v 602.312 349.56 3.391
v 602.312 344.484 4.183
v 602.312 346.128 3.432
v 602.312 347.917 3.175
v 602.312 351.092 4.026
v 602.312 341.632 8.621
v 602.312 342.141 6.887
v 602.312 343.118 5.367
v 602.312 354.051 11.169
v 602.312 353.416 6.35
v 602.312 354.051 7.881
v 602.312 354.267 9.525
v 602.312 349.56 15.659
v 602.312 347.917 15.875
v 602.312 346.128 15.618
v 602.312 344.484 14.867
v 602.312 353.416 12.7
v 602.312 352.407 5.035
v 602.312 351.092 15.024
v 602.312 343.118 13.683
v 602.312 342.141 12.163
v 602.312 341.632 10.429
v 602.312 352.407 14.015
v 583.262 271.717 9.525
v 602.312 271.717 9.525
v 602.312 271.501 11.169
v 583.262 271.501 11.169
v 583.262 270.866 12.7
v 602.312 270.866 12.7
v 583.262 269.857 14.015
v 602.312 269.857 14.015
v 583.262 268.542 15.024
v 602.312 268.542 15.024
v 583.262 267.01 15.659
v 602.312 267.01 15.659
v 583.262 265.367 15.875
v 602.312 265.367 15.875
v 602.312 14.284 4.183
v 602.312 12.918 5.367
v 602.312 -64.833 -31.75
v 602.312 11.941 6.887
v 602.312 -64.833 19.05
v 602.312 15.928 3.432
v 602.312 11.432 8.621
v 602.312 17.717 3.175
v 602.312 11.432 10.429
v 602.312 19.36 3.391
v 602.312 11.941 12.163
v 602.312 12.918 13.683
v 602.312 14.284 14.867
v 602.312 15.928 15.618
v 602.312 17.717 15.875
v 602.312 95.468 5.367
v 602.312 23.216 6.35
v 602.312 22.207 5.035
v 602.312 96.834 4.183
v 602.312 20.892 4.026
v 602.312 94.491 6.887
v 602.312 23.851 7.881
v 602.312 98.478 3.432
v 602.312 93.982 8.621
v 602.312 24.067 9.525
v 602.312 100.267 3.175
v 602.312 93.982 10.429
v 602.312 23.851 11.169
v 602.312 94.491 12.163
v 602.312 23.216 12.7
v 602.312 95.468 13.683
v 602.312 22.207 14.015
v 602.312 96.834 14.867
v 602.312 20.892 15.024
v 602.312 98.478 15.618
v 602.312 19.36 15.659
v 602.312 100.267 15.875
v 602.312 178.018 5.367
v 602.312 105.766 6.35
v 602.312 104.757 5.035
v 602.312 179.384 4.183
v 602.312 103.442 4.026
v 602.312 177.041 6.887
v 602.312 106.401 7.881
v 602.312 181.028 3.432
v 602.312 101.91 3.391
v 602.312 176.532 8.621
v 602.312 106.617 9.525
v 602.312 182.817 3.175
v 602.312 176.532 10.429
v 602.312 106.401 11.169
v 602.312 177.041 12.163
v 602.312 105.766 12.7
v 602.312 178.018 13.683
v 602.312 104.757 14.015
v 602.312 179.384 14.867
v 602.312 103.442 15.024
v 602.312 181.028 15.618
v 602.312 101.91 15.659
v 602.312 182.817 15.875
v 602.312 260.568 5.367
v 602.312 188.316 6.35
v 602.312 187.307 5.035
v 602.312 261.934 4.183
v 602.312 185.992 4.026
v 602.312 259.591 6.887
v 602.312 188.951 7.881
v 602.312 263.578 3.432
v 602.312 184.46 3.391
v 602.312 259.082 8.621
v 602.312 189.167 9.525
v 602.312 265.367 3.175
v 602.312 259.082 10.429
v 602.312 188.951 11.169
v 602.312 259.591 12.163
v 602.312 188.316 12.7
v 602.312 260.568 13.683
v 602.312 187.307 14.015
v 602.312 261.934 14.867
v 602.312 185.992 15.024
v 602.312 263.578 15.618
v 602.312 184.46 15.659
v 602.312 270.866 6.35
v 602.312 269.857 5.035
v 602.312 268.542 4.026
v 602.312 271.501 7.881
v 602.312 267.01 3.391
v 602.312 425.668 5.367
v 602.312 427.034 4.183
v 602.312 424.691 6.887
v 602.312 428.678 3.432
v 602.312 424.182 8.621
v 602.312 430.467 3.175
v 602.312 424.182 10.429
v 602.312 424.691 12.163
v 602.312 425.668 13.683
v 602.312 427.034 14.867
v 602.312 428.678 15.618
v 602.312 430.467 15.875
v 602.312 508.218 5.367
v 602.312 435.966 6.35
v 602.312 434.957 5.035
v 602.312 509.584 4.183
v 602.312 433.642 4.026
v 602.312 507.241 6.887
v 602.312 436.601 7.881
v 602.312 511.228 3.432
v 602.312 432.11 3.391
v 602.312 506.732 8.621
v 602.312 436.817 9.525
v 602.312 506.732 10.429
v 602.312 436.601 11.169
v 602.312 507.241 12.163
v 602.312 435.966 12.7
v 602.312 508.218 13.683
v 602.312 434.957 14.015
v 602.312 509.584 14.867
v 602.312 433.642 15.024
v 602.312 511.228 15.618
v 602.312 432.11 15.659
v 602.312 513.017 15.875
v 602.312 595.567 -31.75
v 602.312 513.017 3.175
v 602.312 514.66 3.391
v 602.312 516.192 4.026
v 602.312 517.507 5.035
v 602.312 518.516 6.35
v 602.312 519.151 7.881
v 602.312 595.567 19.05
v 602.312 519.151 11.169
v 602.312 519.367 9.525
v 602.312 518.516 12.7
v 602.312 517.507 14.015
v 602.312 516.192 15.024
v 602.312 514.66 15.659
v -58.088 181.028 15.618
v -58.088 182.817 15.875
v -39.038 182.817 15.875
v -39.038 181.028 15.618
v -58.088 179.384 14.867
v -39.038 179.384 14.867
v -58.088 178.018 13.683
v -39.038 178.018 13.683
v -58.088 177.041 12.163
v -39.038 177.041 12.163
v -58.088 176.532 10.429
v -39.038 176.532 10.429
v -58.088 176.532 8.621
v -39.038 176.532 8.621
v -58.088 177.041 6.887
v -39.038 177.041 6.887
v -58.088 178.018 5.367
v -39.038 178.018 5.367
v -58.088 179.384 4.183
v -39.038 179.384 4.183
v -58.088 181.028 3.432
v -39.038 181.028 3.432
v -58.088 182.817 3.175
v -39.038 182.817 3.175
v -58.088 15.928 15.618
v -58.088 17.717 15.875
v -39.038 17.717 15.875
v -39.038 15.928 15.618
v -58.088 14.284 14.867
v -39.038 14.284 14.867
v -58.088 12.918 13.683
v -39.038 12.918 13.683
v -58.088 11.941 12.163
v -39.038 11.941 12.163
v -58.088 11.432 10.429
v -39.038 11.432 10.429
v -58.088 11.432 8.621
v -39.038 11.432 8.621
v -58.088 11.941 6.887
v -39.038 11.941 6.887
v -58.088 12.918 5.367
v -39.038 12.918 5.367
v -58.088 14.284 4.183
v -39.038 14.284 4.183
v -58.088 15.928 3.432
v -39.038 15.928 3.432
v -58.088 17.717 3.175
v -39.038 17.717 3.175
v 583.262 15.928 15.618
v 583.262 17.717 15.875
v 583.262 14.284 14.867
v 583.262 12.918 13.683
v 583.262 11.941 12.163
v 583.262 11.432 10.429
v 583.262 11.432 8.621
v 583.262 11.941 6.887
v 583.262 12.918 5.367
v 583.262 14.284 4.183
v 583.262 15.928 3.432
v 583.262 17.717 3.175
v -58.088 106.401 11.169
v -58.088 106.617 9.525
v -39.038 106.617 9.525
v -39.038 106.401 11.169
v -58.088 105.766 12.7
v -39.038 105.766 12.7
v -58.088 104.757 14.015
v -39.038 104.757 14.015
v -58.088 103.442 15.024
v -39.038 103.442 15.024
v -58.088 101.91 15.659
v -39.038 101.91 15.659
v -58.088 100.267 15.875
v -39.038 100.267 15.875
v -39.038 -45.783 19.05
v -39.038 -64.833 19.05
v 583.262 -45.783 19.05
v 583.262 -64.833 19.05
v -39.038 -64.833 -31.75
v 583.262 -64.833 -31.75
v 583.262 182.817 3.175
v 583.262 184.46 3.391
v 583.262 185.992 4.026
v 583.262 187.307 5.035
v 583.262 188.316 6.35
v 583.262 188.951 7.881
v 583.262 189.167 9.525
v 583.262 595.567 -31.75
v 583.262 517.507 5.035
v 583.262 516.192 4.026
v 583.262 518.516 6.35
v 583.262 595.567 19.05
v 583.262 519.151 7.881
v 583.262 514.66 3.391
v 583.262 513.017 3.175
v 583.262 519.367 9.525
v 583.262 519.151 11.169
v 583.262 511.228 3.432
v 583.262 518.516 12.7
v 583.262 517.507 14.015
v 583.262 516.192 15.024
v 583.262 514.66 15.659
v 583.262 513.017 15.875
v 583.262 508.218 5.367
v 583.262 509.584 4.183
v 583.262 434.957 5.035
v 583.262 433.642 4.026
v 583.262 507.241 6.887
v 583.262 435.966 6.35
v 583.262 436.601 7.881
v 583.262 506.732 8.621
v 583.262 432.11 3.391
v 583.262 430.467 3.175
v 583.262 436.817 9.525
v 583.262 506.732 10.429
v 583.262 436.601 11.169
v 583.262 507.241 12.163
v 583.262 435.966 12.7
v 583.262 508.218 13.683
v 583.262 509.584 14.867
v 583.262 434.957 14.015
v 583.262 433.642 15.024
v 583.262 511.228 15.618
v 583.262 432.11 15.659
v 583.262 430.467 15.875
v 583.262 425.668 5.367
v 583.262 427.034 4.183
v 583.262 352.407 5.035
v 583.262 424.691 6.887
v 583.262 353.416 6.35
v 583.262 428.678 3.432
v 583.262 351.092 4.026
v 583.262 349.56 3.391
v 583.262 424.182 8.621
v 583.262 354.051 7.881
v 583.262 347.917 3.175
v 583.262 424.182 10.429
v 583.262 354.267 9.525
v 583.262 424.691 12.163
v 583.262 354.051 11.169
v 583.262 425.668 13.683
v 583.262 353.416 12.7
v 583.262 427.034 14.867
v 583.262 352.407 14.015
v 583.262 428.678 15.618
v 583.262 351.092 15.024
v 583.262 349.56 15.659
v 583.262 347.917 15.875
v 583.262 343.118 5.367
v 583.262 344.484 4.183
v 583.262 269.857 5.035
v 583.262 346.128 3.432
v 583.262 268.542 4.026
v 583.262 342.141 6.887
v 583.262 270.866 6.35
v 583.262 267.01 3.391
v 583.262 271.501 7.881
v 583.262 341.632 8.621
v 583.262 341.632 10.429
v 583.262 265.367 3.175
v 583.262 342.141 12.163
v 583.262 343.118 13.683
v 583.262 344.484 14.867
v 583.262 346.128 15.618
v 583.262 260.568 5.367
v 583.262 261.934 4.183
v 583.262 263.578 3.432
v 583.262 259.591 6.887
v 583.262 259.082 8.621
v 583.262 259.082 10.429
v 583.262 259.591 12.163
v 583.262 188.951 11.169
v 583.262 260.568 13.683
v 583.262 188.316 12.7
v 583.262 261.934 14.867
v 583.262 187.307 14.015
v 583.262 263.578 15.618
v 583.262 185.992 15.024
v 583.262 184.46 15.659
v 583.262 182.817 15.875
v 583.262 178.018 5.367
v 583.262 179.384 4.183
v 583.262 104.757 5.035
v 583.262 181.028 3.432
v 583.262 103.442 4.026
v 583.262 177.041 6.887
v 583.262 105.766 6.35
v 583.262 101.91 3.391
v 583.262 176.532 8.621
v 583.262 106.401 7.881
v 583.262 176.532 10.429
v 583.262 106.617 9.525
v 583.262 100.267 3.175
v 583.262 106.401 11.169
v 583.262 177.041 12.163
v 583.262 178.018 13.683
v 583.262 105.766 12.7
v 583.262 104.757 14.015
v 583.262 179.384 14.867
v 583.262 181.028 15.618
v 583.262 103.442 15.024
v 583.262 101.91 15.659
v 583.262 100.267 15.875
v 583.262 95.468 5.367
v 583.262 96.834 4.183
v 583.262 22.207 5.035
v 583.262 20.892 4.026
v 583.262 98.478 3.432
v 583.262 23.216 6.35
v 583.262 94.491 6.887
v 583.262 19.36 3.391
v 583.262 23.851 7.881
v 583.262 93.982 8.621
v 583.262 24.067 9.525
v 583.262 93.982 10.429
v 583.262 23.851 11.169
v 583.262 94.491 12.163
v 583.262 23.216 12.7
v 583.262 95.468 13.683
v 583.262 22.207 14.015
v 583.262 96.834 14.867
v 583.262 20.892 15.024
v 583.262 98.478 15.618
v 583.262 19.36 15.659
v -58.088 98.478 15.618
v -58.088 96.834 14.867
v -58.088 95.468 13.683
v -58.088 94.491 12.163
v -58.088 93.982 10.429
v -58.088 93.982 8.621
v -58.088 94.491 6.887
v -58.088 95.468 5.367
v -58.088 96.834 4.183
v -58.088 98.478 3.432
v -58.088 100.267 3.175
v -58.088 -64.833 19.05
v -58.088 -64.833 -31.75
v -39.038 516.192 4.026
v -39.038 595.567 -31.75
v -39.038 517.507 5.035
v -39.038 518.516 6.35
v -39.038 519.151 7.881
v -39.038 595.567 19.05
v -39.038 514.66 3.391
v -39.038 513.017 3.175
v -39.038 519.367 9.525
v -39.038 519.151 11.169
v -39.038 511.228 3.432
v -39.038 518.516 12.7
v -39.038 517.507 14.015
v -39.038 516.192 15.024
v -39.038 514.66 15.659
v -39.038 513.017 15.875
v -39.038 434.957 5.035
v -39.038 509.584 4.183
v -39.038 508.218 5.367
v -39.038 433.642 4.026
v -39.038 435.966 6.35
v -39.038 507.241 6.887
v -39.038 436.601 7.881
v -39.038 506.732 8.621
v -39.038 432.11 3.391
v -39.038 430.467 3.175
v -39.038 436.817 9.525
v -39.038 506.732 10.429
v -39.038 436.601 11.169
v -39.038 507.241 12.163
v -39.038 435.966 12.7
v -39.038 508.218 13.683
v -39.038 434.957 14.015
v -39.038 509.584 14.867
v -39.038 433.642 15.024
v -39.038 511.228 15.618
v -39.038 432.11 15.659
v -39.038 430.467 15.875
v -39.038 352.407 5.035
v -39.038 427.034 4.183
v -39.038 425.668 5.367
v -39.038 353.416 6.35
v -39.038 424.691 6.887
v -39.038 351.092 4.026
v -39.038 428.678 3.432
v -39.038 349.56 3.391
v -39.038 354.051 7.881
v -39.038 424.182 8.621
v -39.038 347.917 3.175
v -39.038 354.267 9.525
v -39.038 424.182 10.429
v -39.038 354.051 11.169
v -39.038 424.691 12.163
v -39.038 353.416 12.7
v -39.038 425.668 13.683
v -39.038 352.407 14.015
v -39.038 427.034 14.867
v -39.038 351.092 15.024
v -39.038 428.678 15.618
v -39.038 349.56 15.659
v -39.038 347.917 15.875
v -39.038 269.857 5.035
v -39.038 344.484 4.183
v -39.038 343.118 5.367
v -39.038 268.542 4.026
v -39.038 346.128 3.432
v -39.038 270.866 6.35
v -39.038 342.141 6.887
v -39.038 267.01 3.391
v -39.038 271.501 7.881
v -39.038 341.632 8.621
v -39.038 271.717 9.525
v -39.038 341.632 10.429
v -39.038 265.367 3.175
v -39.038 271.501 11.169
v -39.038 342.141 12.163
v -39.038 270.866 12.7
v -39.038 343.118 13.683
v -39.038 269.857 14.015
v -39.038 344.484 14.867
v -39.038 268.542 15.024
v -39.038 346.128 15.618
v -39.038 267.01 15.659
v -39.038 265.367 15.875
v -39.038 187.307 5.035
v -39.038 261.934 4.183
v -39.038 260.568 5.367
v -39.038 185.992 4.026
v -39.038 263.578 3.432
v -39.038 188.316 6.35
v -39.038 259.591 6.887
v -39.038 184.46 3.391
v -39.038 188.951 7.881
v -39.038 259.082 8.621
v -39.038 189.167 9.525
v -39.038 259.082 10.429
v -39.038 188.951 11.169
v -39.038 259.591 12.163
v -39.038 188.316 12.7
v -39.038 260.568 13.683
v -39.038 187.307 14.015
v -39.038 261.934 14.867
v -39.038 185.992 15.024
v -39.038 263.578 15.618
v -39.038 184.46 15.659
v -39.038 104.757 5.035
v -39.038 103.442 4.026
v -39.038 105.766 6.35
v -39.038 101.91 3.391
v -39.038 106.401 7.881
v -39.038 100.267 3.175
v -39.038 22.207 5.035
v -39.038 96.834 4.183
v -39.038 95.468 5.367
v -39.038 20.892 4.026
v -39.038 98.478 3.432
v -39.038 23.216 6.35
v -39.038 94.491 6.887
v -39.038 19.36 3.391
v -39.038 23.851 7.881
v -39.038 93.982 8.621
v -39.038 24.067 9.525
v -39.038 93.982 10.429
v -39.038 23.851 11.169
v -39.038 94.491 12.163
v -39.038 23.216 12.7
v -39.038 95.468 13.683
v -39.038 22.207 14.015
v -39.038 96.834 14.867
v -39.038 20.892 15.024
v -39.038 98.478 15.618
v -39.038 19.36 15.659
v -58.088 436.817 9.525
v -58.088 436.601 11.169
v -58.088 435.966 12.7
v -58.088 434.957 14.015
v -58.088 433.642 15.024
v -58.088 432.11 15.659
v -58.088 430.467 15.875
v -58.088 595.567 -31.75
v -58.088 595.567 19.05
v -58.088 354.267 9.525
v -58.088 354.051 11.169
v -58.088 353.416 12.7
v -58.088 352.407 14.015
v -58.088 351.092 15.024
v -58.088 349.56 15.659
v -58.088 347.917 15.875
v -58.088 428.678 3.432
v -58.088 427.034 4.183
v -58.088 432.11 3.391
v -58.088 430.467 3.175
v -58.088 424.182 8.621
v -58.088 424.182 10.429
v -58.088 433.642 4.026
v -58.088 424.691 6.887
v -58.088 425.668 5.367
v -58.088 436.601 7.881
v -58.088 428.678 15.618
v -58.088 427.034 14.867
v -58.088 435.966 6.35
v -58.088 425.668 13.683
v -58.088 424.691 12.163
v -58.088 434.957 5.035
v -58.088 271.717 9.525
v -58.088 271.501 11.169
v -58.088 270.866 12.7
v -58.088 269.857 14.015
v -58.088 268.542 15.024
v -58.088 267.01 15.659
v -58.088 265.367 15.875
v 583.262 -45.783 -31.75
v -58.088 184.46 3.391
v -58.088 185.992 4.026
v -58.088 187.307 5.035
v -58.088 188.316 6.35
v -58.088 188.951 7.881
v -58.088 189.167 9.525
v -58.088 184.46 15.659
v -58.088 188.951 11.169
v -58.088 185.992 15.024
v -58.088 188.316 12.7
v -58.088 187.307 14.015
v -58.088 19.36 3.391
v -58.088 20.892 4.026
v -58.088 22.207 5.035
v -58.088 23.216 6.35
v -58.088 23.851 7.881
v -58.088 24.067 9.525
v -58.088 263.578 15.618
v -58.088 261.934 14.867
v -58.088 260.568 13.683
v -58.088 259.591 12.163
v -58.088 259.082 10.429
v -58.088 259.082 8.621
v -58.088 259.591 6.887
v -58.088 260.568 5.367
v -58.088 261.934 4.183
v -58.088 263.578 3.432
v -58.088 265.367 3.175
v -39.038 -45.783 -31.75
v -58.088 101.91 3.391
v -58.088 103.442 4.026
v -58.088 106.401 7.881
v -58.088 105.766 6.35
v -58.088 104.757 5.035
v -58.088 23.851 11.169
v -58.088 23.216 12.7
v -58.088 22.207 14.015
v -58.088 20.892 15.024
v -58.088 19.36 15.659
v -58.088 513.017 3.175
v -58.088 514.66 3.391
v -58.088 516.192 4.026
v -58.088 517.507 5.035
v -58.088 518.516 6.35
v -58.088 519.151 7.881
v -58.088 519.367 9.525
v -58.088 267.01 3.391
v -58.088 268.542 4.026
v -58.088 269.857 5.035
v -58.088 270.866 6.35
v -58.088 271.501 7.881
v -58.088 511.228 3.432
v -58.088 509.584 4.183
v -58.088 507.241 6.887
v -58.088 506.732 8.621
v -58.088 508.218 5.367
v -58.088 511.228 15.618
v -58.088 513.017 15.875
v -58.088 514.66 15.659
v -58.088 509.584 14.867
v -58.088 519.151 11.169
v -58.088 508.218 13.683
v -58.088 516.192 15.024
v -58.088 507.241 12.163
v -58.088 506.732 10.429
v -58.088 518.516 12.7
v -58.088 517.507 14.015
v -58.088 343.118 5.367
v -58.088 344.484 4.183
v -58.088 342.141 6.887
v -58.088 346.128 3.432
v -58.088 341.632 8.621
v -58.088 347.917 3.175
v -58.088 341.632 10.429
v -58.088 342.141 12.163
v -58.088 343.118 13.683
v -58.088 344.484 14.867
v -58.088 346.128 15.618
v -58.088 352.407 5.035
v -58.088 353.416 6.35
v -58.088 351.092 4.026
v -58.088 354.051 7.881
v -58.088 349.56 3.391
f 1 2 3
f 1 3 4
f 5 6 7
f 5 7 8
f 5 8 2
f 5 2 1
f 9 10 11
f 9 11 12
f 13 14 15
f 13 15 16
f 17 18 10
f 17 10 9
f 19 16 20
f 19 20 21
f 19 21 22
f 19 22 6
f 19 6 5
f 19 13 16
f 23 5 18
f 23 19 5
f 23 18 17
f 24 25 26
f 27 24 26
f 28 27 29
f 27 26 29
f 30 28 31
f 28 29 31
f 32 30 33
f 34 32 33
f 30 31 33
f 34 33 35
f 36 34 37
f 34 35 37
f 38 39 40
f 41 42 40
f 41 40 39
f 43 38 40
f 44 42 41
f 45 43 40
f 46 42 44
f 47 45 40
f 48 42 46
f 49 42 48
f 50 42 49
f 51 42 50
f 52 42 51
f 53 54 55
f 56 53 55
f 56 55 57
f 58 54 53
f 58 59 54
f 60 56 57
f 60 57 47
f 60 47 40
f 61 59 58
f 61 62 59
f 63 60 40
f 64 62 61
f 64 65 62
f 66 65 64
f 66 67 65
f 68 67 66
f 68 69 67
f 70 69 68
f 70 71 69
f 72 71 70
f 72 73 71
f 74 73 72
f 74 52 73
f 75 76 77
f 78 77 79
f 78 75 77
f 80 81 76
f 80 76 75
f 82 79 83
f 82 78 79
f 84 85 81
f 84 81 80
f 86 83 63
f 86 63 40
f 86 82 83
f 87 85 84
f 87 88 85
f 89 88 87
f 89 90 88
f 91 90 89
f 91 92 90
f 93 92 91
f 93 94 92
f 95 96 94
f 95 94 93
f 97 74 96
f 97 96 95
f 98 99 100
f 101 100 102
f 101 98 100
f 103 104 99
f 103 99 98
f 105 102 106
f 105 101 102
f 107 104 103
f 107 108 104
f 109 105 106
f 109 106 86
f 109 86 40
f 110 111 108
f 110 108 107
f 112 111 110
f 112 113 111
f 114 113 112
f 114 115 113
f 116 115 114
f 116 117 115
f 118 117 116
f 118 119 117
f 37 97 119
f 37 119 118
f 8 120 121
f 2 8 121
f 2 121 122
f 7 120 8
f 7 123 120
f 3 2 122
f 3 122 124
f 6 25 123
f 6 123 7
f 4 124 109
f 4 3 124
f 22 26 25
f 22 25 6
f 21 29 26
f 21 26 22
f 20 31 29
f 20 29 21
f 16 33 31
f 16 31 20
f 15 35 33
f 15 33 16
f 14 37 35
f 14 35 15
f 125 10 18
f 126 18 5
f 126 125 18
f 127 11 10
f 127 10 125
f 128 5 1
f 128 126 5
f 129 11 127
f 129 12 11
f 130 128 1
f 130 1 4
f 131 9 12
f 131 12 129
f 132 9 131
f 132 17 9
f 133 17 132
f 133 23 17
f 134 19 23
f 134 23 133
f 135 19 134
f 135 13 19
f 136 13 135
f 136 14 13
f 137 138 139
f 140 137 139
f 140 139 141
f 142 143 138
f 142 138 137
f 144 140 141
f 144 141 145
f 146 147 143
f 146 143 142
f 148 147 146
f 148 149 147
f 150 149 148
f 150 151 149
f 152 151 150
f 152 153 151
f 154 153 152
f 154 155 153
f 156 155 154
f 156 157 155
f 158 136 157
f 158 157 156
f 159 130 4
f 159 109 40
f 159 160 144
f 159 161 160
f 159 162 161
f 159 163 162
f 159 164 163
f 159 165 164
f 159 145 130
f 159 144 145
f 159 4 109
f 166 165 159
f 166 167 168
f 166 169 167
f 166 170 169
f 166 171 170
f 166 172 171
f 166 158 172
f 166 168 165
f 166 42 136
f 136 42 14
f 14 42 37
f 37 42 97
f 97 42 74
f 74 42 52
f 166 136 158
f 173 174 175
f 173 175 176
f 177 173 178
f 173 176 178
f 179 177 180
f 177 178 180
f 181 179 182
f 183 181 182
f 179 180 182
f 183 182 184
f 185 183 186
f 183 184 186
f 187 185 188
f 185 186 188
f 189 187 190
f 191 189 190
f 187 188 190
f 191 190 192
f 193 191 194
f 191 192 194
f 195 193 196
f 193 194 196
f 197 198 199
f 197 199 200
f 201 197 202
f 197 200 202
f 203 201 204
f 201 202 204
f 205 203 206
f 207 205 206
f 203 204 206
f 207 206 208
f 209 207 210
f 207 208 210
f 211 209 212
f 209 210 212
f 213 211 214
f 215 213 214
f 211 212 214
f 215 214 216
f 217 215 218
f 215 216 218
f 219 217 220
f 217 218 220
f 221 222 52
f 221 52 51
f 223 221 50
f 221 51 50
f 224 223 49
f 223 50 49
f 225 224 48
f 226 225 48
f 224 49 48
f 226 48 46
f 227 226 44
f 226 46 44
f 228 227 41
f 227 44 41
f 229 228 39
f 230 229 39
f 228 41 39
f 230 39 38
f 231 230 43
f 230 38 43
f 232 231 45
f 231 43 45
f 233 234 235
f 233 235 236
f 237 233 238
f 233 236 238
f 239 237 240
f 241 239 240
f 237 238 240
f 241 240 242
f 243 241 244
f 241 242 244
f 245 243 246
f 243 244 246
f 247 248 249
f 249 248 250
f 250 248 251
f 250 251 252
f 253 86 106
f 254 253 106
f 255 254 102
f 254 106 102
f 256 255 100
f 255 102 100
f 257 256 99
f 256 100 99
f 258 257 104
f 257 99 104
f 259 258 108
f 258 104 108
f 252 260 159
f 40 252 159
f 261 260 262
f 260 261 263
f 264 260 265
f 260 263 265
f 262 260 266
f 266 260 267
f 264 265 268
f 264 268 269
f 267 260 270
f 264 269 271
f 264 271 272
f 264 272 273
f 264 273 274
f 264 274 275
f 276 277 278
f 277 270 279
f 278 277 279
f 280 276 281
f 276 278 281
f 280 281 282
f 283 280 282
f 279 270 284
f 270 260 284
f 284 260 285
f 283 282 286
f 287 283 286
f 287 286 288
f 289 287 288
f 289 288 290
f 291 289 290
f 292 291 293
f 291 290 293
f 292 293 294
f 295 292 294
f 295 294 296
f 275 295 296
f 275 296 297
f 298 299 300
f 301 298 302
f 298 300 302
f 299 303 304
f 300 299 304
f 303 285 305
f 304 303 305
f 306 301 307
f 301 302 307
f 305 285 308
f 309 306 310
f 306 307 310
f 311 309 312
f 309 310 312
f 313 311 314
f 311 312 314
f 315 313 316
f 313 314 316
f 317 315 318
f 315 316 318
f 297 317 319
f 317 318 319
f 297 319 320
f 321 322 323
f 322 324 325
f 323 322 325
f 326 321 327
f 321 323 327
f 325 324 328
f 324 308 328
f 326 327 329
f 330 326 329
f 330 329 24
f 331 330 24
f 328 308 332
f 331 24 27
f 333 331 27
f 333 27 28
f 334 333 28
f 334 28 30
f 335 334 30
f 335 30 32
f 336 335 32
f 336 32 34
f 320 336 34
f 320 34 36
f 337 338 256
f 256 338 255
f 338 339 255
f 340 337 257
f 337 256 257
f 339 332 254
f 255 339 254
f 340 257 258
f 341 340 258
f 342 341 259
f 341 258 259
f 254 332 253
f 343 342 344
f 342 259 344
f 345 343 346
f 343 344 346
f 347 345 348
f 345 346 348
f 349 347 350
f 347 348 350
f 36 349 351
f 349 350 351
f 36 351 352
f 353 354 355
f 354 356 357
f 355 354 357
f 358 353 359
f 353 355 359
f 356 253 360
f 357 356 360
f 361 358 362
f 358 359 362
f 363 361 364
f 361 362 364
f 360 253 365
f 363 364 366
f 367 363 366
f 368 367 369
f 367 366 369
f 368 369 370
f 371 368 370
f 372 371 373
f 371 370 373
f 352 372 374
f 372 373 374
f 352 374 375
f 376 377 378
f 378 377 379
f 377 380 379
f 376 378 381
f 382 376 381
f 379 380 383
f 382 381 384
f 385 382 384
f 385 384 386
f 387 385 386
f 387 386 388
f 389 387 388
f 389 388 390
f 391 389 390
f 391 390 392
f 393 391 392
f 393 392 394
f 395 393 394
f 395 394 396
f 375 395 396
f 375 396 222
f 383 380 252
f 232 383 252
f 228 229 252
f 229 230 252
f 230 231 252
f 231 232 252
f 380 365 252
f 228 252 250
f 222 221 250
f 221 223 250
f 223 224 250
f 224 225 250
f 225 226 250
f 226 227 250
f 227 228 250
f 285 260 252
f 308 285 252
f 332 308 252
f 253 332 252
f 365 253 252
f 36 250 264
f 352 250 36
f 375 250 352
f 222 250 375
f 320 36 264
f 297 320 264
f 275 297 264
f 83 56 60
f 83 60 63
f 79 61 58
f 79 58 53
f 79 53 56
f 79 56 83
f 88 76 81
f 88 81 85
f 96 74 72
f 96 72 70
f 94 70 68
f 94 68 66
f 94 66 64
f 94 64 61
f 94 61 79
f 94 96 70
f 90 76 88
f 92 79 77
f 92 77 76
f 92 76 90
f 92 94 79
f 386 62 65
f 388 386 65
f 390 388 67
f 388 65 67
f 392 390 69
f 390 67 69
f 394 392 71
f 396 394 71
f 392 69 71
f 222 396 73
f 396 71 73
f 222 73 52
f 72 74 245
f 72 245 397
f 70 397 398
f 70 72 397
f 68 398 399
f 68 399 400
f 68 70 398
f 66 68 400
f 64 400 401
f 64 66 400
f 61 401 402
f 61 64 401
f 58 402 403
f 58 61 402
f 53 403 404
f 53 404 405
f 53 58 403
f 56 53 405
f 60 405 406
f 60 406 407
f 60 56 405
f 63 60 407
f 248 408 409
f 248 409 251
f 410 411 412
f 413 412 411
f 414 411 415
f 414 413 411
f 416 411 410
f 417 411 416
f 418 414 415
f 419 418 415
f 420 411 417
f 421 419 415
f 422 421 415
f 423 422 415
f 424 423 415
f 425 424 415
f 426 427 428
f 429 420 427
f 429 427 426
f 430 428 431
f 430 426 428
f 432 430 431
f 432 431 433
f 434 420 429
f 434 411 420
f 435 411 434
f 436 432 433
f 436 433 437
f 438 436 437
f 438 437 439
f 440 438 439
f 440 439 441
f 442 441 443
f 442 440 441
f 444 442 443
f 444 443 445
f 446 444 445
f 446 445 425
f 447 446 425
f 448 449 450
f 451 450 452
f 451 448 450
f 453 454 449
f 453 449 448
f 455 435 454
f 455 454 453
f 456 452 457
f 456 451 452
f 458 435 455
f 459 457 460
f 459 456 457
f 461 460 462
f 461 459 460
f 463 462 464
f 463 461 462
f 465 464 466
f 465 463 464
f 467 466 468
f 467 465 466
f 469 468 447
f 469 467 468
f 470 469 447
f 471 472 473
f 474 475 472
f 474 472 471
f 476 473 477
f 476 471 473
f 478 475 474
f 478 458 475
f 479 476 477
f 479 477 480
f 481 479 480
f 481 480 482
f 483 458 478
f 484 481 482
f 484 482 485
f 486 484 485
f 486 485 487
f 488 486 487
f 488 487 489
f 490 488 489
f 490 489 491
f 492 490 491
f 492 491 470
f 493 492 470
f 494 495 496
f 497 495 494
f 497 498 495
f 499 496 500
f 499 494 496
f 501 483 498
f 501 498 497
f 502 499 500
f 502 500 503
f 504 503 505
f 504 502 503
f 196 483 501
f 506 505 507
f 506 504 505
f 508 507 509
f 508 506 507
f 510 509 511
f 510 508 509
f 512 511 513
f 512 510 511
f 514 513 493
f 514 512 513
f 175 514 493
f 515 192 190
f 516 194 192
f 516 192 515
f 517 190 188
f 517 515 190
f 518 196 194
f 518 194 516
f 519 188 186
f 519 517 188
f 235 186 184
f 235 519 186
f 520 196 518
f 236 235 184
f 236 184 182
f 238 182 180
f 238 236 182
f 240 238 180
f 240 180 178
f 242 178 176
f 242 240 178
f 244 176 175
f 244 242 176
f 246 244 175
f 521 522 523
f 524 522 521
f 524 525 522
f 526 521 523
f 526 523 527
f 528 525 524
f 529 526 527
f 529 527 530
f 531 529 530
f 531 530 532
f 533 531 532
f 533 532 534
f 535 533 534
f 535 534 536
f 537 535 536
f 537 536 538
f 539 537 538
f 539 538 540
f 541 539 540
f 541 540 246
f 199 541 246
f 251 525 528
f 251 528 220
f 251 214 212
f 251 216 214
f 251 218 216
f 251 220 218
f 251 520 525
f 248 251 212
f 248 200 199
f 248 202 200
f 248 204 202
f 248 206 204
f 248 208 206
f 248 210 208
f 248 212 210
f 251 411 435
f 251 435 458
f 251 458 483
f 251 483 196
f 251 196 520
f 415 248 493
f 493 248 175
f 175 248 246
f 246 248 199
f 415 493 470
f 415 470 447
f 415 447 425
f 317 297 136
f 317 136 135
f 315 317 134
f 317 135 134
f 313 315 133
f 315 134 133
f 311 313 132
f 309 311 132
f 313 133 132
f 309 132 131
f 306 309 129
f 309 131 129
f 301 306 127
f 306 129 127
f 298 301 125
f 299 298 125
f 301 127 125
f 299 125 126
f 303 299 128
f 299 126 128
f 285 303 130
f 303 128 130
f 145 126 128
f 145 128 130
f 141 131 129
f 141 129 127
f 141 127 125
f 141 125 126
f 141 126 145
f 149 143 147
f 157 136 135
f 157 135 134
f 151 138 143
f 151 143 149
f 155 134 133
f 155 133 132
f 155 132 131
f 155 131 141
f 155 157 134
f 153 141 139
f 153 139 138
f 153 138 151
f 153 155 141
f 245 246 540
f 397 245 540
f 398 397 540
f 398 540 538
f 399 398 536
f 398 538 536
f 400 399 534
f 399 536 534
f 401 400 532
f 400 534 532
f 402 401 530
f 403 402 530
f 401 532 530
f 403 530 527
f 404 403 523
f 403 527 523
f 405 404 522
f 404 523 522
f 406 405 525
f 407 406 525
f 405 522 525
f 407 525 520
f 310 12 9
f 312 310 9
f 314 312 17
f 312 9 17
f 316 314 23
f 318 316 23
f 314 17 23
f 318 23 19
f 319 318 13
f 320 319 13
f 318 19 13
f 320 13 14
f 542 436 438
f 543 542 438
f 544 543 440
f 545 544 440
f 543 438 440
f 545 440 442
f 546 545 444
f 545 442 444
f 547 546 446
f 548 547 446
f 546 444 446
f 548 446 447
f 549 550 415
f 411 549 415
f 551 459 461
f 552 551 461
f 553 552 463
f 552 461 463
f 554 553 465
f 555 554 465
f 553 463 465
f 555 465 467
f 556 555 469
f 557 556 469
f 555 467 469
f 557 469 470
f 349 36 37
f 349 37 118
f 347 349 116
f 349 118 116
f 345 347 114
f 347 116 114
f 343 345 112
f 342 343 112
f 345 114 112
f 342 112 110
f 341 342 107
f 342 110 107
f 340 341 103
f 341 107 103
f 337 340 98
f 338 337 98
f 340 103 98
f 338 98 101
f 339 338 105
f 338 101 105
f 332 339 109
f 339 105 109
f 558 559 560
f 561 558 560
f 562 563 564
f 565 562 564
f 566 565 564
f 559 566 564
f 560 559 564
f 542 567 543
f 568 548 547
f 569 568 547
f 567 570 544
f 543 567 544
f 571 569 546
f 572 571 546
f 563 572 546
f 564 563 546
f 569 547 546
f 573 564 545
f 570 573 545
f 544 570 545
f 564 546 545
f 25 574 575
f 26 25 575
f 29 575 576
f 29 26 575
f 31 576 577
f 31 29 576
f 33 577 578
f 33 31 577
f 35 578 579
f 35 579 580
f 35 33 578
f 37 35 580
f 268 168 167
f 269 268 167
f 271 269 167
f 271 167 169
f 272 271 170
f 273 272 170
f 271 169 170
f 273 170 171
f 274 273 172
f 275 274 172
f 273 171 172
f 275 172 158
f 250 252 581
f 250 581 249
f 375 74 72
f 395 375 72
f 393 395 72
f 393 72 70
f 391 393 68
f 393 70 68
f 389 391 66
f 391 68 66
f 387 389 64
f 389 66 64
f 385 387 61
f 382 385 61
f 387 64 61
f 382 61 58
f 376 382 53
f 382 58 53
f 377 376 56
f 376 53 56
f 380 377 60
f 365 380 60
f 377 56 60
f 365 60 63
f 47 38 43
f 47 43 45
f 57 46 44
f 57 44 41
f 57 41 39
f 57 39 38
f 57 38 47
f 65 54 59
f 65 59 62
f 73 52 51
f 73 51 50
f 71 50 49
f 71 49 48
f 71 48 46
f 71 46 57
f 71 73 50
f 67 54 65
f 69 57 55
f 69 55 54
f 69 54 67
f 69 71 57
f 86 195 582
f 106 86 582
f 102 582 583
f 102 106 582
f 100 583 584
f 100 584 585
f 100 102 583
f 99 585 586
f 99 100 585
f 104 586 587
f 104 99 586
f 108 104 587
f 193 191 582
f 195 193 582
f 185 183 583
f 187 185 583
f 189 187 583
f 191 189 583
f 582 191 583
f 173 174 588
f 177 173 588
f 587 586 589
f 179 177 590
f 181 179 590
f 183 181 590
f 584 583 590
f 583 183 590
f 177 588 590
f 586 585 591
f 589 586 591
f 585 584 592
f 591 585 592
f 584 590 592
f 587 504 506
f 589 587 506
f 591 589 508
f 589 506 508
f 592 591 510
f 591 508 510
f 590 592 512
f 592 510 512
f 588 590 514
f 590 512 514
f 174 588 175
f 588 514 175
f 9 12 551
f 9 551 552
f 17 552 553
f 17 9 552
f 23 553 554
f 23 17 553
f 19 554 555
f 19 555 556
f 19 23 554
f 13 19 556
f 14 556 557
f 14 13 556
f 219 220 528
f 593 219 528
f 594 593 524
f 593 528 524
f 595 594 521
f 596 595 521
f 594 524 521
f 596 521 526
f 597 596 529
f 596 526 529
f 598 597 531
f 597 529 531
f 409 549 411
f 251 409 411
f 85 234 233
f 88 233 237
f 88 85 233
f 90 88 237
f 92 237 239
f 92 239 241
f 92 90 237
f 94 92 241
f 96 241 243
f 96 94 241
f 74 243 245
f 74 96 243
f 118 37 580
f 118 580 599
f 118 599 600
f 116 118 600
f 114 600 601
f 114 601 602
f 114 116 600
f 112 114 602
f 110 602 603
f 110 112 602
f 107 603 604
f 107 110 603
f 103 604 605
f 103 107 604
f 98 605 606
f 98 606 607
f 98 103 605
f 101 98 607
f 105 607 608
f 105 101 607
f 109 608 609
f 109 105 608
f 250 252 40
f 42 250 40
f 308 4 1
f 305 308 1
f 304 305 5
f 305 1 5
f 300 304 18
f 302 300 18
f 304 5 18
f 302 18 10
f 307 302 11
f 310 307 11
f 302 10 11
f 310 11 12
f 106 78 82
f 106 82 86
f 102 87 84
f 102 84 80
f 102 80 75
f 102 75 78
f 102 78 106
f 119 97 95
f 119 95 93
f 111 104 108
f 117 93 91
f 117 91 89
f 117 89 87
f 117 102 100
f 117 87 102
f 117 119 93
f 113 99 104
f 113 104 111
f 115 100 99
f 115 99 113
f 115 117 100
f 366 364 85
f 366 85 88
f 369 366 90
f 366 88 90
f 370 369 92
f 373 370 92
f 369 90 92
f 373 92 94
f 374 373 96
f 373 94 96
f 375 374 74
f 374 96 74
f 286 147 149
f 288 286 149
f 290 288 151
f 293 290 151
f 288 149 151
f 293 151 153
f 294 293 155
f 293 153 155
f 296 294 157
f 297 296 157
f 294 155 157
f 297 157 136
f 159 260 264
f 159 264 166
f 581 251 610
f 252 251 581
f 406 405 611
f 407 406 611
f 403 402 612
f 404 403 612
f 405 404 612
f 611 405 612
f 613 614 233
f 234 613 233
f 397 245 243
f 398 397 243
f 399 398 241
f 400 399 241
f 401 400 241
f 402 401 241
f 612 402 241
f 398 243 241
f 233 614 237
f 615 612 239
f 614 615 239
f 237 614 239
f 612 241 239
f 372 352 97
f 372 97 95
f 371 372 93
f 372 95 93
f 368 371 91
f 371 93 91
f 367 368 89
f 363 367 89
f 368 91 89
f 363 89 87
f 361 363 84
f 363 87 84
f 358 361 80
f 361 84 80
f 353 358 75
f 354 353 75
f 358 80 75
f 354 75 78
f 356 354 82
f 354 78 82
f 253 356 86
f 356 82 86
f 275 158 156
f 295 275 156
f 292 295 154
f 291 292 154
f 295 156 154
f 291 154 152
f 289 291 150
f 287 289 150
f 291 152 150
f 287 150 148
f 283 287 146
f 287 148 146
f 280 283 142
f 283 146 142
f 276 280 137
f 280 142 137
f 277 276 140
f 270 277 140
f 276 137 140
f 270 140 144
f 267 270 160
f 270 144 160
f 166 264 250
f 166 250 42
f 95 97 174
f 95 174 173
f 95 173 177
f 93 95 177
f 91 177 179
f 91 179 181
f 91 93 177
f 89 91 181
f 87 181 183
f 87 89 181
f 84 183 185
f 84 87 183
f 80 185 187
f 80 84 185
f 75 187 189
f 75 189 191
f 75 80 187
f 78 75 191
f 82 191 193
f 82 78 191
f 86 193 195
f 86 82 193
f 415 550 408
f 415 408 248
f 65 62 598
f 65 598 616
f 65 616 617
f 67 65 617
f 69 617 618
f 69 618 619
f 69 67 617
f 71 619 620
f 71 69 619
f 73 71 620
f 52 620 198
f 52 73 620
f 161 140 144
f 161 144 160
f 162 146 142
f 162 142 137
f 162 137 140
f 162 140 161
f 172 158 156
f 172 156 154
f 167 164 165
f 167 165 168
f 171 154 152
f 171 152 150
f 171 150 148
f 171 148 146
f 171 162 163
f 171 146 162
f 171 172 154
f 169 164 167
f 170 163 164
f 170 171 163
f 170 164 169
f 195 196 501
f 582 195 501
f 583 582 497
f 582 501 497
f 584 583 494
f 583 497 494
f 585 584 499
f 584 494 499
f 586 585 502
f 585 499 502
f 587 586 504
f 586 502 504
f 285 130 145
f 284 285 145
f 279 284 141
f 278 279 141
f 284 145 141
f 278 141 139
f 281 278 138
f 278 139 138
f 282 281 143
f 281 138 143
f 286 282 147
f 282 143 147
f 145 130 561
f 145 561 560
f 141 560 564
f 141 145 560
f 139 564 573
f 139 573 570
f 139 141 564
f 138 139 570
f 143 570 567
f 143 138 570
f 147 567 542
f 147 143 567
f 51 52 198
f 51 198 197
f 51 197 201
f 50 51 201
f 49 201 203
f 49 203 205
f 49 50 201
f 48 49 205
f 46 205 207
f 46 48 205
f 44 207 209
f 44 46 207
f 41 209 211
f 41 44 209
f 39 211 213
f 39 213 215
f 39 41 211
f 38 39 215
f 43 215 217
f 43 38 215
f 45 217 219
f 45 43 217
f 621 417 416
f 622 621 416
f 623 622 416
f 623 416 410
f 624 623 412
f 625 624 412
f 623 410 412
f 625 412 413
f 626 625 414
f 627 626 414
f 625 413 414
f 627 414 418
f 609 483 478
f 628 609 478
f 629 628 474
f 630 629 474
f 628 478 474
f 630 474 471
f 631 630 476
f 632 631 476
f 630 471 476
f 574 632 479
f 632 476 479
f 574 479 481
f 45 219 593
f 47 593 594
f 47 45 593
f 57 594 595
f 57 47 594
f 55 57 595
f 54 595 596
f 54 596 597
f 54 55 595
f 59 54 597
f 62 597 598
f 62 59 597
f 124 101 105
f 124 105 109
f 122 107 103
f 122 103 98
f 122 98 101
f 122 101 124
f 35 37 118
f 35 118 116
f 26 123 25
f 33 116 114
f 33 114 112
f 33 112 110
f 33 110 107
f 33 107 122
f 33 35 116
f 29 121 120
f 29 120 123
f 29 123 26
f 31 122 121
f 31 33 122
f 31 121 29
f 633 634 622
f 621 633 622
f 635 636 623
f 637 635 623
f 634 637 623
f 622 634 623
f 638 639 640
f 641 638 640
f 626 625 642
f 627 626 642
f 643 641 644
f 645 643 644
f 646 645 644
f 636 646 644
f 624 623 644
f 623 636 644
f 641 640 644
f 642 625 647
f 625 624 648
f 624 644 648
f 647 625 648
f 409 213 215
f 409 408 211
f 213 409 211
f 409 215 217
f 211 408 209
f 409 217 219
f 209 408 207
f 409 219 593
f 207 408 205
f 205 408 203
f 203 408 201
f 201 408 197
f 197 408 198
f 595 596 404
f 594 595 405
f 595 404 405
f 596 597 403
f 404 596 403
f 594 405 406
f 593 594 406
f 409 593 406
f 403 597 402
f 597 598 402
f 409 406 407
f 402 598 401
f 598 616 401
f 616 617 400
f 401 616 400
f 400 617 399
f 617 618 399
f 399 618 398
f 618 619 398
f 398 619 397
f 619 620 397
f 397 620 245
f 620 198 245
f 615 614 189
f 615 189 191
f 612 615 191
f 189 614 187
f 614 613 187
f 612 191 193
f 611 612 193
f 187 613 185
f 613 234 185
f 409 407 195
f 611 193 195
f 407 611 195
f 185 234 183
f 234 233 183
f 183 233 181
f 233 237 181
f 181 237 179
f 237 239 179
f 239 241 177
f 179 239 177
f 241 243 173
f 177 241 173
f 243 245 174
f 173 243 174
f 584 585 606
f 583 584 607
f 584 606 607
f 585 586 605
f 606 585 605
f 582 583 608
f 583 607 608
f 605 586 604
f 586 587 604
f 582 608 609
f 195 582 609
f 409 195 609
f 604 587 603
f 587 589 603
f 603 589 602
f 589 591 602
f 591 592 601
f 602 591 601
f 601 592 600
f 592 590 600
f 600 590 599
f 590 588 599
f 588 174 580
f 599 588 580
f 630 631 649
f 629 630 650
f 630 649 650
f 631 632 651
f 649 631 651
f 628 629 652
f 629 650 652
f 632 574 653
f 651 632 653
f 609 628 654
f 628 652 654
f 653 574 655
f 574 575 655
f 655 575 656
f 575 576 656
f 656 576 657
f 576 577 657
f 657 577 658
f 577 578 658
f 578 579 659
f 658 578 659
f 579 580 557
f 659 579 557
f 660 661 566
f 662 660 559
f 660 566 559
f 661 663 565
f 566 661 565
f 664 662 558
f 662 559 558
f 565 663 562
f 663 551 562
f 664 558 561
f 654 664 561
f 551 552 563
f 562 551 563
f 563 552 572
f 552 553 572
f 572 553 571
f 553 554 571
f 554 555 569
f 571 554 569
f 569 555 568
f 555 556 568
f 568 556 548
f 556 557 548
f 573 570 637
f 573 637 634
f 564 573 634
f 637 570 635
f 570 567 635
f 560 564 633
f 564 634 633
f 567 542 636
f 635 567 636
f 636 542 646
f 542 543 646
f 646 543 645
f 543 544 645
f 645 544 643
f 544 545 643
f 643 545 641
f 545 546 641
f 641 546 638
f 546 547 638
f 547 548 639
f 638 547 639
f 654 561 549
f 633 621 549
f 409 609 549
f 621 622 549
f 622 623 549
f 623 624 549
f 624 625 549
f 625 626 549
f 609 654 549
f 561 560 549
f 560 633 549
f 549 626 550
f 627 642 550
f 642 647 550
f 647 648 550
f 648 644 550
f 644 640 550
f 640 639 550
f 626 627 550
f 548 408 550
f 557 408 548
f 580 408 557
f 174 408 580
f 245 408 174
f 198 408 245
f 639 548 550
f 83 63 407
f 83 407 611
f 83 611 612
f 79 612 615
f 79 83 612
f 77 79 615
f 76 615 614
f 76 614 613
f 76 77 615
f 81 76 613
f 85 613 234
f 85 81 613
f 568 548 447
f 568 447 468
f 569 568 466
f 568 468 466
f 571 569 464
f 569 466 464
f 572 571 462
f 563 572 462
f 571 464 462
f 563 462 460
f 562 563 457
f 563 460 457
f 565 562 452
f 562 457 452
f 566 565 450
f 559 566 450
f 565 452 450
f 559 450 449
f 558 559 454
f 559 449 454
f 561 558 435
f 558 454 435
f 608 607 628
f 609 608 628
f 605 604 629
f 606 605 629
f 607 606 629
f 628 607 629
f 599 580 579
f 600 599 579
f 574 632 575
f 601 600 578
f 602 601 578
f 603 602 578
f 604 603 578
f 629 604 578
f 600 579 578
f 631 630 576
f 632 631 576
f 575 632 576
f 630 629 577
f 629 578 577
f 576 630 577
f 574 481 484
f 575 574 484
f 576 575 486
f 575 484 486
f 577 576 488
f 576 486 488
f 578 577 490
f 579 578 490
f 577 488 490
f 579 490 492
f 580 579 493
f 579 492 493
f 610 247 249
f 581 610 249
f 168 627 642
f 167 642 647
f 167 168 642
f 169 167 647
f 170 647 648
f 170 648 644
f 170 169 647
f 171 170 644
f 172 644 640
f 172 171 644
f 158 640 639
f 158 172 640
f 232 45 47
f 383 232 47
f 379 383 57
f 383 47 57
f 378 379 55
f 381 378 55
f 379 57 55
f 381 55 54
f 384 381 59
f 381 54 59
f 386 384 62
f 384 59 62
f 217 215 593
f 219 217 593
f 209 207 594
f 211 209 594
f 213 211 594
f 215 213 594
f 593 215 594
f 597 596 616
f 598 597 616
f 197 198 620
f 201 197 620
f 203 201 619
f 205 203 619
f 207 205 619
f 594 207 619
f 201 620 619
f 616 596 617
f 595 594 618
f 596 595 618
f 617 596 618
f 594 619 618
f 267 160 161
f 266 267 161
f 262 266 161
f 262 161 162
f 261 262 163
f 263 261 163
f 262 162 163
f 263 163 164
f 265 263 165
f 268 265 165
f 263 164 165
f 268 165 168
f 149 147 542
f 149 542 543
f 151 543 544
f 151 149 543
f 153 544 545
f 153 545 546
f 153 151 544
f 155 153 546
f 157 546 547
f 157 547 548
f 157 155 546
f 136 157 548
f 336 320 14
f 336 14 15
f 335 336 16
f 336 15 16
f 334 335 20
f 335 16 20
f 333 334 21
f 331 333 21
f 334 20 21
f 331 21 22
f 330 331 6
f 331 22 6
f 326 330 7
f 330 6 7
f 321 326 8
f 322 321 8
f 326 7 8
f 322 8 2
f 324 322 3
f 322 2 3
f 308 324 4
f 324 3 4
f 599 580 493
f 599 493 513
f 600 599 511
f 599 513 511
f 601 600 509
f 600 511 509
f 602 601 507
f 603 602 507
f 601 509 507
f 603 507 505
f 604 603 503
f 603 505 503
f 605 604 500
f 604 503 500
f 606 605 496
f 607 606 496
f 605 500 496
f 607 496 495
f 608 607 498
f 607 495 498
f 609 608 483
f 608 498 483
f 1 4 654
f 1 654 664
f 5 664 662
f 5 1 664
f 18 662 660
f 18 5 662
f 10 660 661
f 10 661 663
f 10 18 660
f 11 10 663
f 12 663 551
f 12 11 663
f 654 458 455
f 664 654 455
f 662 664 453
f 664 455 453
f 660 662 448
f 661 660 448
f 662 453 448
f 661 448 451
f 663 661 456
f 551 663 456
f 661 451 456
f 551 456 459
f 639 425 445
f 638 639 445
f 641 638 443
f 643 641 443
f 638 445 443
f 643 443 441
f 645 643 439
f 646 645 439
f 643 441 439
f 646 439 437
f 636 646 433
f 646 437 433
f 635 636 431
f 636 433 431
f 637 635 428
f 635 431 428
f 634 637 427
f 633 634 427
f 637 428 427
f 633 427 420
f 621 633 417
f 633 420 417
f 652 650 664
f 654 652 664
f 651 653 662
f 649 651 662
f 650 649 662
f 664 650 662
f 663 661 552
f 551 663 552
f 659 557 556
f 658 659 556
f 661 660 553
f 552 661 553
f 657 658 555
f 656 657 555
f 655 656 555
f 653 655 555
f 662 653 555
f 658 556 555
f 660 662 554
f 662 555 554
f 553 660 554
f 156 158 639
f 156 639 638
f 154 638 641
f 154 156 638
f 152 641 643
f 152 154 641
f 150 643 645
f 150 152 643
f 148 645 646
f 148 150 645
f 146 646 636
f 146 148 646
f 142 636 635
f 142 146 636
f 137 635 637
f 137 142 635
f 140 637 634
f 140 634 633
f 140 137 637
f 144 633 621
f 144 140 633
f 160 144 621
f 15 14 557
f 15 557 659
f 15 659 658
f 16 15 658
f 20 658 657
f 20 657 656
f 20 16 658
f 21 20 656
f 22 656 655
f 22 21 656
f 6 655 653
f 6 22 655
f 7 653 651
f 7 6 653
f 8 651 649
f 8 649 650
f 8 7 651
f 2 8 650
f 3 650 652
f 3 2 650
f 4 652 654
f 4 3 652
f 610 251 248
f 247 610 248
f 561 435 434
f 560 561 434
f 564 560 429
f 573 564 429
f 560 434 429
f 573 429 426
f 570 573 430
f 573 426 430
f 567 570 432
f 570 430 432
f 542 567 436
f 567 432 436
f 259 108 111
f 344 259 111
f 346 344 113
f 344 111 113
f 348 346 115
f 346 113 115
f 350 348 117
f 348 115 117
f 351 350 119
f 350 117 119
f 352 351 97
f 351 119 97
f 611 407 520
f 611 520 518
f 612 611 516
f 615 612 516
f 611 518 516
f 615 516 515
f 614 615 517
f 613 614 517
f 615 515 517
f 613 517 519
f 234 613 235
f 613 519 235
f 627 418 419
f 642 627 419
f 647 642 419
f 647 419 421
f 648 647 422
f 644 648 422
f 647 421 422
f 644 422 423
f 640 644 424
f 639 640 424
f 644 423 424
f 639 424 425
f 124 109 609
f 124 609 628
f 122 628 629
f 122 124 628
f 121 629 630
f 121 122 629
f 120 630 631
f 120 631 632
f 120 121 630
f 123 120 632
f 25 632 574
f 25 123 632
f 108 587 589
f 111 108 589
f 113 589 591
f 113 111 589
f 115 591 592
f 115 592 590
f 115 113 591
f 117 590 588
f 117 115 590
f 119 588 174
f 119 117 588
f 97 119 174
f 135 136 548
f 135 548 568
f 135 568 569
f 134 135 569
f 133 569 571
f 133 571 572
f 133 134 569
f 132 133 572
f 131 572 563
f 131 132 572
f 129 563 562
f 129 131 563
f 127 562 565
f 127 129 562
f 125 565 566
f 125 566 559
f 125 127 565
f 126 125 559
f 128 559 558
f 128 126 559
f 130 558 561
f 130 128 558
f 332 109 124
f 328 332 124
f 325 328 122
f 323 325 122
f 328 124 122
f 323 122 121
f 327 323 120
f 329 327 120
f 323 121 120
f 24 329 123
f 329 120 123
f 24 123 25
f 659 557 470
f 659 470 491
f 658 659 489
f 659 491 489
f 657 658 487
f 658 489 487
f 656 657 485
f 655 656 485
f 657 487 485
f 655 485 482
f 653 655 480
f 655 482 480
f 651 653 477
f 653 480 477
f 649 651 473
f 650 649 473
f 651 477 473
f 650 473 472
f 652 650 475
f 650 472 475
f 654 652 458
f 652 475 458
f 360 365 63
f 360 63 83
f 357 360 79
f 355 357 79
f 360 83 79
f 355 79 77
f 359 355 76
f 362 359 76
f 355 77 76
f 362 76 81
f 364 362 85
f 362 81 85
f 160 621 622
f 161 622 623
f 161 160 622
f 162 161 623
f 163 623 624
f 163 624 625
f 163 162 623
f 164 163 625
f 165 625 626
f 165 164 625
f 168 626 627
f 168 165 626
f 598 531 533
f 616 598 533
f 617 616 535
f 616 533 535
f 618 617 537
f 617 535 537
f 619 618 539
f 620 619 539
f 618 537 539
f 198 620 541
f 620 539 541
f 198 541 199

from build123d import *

# Parameters (mm, degrees)
F0_W      = 660.4
F0_H      = 660.4
F1_DEPTH  = 19.05
F3_DEPTH  = 660.401
F4_W      = 622.3
F4_H      = 622.3
F5_DEPTH  = 19.051
F6_DEPTH  = 660.4
F7_DEPTH  = 31.75
F8_W      = 622.3
F8_H      = 50.8
F9_DEPTH  = 660.401
F10_DEPTH = 19.05


with BuildPart() as f1:
    # F0 (on Top) → F1 (new body)
    with BuildSketch(Plane.XY):
        with Locations((272.1124062419, 265.3669889885)):
            Rectangle(F0_W, F0_H)
    extrude(amount=F1_DEPTH)

    # F2 (on face) → F3 (cut, through all)
    with BuildSketch(Plane.YZ.offset(602.3124062419)):
        with BuildLine():
            Line((265.3669889885, 3.175), (265.3669889885, 15.875))
            ThreePointArc((265.3669889885, 15.875), (259.0169889885, 9.525), (265.3669889885, 3.175))
        make_face()
        with BuildLine():
            Line((100.2669889885, 3.175), (100.2669889885, 15.875))
            ThreePointArc((100.2669889885, 15.875), (93.9169889885, 9.525), (100.2669889885, 3.175))
        make_face()
        with BuildLine():
            ThreePointArc((436.8169889885, 9.525), (434.957117049, 14.0151280605), (430.4669889885, 15.875))
            Line((430.4669889885, 15.875), (430.4669889885, 3.175))
            ThreePointArc((430.4669889885, 3.175), (434.957117049, 5.0348719395), (436.8169889885, 9.525))
        make_face()
        with BuildLine():
            Line((182.8169889885, 3.175), (182.8169889885, 15.875))
            ThreePointArc((182.8169889885, 15.875), (176.4669889885, 9.525), (182.8169889885, 3.175))
        make_face()
        with BuildLine():
            Line((347.9169889885, 3.175), (347.9169889885, 15.875))
            ThreePointArc((347.9169889885, 15.875), (341.5669889885, 9.525), (347.9169889885, 3.175))
        make_face()
        with BuildLine():
            Line((17.7169889885, 3.175), (17.7169889885, 15.875))
            ThreePointArc((17.7169889885, 15.875), (11.3669889885, 9.525), (17.7169889885, 3.175))
        make_face()
        with BuildLine():
            ThreePointArc((24.0669889885, 9.525), (22.207117049, 14.0151280605), (17.7169889885, 15.875))
            Line((17.7169889885, 15.875), (17.7169889885, 3.175))
            ThreePointArc((17.7169889885, 3.175), (22.207117049, 5.0348719395), (24.0669889885, 9.525))
        make_face()
        with BuildLine():
            Line((513.0169889885, 3.175), (513.0169889885, 15.875))
            ThreePointArc((513.0169889885, 15.875), (506.6669889885, 9.525), (513.0169889885, 3.175))
        make_face()
        with BuildLine():
            ThreePointArc((519.3669889885, 9.525), (517.507117049, 14.0151280605), (513.0169889885, 15.875))
            Line((513.0169889885, 15.875), (513.0169889885, 3.175))
            ThreePointArc((513.0169889885, 3.175), (517.507117049, 5.0348719395), (519.3669889885, 9.525))
        make_face()
        with BuildLine():
            Line((430.4669889885, 3.175), (430.4669889885, 15.875))
            ThreePointArc((430.4669889885, 15.875), (424.1169889885, 9.525), (430.4669889885, 3.175))
        make_face()
        with BuildLine():
            ThreePointArc((354.2669889885, 9.525), (352.407117049, 14.0151280605), (347.9169889885, 15.875))
            Line((347.9169889885, 15.875), (347.9169889885, 3.175))
            ThreePointArc((347.9169889885, 3.175), (352.407117049, 5.0348719395), (354.2669889885, 9.525))
        make_face()
        with BuildLine():
            ThreePointArc((271.7169889885, 9.525), (269.857117049, 14.0151280605), (265.3669889885, 15.875))
            Line((265.3669889885, 15.875), (265.3669889885, 3.175))
            ThreePointArc((265.3669889885, 3.175), (269.857117049, 5.0348719395), (271.7169889885, 9.525))
        make_face()
        with BuildLine():
            ThreePointArc((106.6169889885, 9.525), (104.757117049, 14.0151280605), (100.2669889885, 15.875))
            Line((100.2669889885, 15.875), (100.2669889885, 3.175))
            ThreePointArc((100.2669889885, 3.175), (104.757117049, 5.0348719395), (106.6169889885, 9.525))
        make_face()
        with BuildLine():
            ThreePointArc((189.1669889885, 9.525), (187.307117049, 14.0151280605), (182.8169889885, 15.875))
            Line((182.8169889885, 15.875), (182.8169889885, 3.175))
            ThreePointArc((182.8169889885, 3.175), (187.307117049, 5.0348719395), (189.1669889885, 9.525))
        make_face()
    extrude(amount=-F3_DEPTH, mode=Mode.SUBTRACT)

    # F4 (on face) → F5 (cut, through all)
    with BuildSketch(Plane.XY.offset(19.05)):
        with Locations((272.1124062419, 265.3669889885)):
            Rectangle(F4_W, F4_H)
    extrude(amount=-F5_DEPTH, mode=Mode.SUBTRACT)

    # F7 (add): a face of the model
    f7_faces = [f1.faces().sort_by_distance(p)[0] for p in [
        (-48.7481273922, 265.3669889885, 0),
    ]]
    extrude(f7_faces, amount=F7_DEPTH)

    # F8 (on face) → F9 (cut, through all)
    with BuildSketch(Plane.XZ.offset(64.8330110115)):
        with Locations((272.1124062419, -6.35)):
            Rectangle(F8_W, F8_H)
    extrude(amount=-F9_DEPTH, mode=Mode.SUBTRACT)


with BuildPart() as f6:
    # F2 (on face) → F6 (new body)
    with BuildSketch(Plane.YZ.offset(602.3124062419)):
        with BuildLine():
            ThreePointArc((271.7169889885, 9.525), (269.857117049, 14.0151280605), (265.3669889885, 15.875))
            Line((265.3669889885, 15.875), (265.3669889885, 3.175))
            ThreePointArc((265.3669889885, 3.175), (269.857117049, 5.0348719395), (271.7169889885, 9.525))
        make_face()
        with BuildLine():
            Line((265.3669889885, 3.175), (265.3669889885, 15.875))
            ThreePointArc((265.3669889885, 15.875), (259.0169889885, 9.525), (265.3669889885, 3.175))
        make_face()
    extrude(amount=-F6_DEPTH)


with BuildPart() as f6b:
    # F2 (on face) → F6, piece 2 (new body)
    with BuildSketch(Plane.YZ.offset(602.3124062419)):
        with BuildLine():
            ThreePointArc((106.6169889885, 9.525), (104.757117049, 14.0151280605), (100.2669889885, 15.875))
            Line((100.2669889885, 15.875), (100.2669889885, 3.175))
            ThreePointArc((100.2669889885, 3.175), (104.757117049, 5.0348719395), (106.6169889885, 9.525))
        make_face()
        with BuildLine():
            Line((100.2669889885, 3.175), (100.2669889885, 15.875))
            ThreePointArc((100.2669889885, 15.875), (93.9169889885, 9.525), (100.2669889885, 3.175))
        make_face()
    extrude(amount=-F6_DEPTH)


with BuildPart() as f6c:
    # F2 (on face) → F6, piece 3 (new body)
    with BuildSketch(Plane.YZ.offset(602.3124062419)):
        with BuildLine():
            ThreePointArc((436.8169889885, 9.525), (434.957117049, 14.0151280605), (430.4669889885, 15.875))
            Line((430.4669889885, 15.875), (430.4669889885, 3.175))
            ThreePointArc((430.4669889885, 3.175), (434.957117049, 5.0348719395), (436.8169889885, 9.525))
        make_face()
        with BuildLine():
            Line((430.4669889885, 3.175), (430.4669889885, 15.875))
            ThreePointArc((430.4669889885, 15.875), (424.1169889885, 9.525), (430.4669889885, 3.175))
        make_face()
    extrude(amount=-F6_DEPTH)


with BuildPart() as f6d:
    # F2 (on face) → F6, piece 4 (new body)
    with BuildSketch(Plane.YZ.offset(602.3124062419)):
        with BuildLine():
            ThreePointArc((189.1669889885, 9.525), (187.307117049, 14.0151280605), (182.8169889885, 15.875))
            Line((182.8169889885, 15.875), (182.8169889885, 3.175))
            ThreePointArc((182.8169889885, 3.175), (187.307117049, 5.0348719395), (189.1669889885, 9.525))
        make_face()
        with BuildLine():
            Line((182.8169889885, 3.175), (182.8169889885, 15.875))
            ThreePointArc((182.8169889885, 15.875), (176.4669889885, 9.525), (182.8169889885, 3.175))
        make_face()
    extrude(amount=-F6_DEPTH)


with BuildPart() as f6e:
    # F2 (on face) → F6, piece 5 (new body)
    with BuildSketch(Plane.YZ.offset(602.3124062419)):
        with BuildLine():
            ThreePointArc((354.2669889885, 9.525), (352.407117049, 14.0151280605), (347.9169889885, 15.875))
            Line((347.9169889885, 15.875), (347.9169889885, 3.175))
            ThreePointArc((347.9169889885, 3.175), (352.407117049, 5.0348719395), (354.2669889885, 9.525))
        make_face()
        with BuildLine():
            Line((347.9169889885, 3.175), (347.9169889885, 15.875))
            ThreePointArc((347.9169889885, 15.875), (341.5669889885, 9.525), (347.9169889885, 3.175))
        make_face()
    extrude(amount=-F6_DEPTH)


with BuildPart() as f6f:
    # F2 (on face) → F6, piece 6 (new body)
    with BuildSketch(Plane.YZ.offset(602.3124062419)):
        with BuildLine():
            ThreePointArc((24.0669889885, 9.525), (22.207117049, 14.0151280605), (17.7169889885, 15.875))
            Line((17.7169889885, 15.875), (17.7169889885, 3.175))
            ThreePointArc((17.7169889885, 3.175), (22.207117049, 5.0348719395), (24.0669889885, 9.525))
        make_face()
        with BuildLine():
            Line((17.7169889885, 3.175), (17.7169889885, 15.875))
            ThreePointArc((17.7169889885, 15.875), (11.3669889885, 9.525), (17.7169889885, 3.175))
        make_face()
    extrude(amount=-F6_DEPTH)


with BuildPart() as f6g:
    # F2 (on face) → F6, piece 7 (new body)
    with BuildSketch(Plane.YZ.offset(602.3124062419)):
        with BuildLine():
            ThreePointArc((519.3669889885, 9.525), (517.507117049, 14.0151280605), (513.0169889885, 15.875))
            Line((513.0169889885, 15.875), (513.0169889885, 3.175))
            ThreePointArc((513.0169889885, 3.175), (517.507117049, 5.0348719395), (519.3669889885, 9.525))
        make_face()
        with BuildLine():
            Line((513.0169889885, 3.175), (513.0169889885, 15.875))
            ThreePointArc((513.0169889885, 15.875), (506.6669889885, 9.525), (513.0169889885, 3.175))
        make_face()
    extrude(amount=-F6_DEPTH)


with BuildPart() as f10:
    # F8 (on face) → F10 (new body)
    with BuildSketch(Plane.XZ.offset(64.8330110115)):
        with Locations((272.1124062419, -6.35)):
            Rectangle(F8_W, F8_H)
    extrude(amount=-F10_DEPTH)


solid = Compound([f1.part, f6.part, f6b.part, f6c.part, f6d.part, f6e.part, f6f.part, f6g.part, f10.part])
